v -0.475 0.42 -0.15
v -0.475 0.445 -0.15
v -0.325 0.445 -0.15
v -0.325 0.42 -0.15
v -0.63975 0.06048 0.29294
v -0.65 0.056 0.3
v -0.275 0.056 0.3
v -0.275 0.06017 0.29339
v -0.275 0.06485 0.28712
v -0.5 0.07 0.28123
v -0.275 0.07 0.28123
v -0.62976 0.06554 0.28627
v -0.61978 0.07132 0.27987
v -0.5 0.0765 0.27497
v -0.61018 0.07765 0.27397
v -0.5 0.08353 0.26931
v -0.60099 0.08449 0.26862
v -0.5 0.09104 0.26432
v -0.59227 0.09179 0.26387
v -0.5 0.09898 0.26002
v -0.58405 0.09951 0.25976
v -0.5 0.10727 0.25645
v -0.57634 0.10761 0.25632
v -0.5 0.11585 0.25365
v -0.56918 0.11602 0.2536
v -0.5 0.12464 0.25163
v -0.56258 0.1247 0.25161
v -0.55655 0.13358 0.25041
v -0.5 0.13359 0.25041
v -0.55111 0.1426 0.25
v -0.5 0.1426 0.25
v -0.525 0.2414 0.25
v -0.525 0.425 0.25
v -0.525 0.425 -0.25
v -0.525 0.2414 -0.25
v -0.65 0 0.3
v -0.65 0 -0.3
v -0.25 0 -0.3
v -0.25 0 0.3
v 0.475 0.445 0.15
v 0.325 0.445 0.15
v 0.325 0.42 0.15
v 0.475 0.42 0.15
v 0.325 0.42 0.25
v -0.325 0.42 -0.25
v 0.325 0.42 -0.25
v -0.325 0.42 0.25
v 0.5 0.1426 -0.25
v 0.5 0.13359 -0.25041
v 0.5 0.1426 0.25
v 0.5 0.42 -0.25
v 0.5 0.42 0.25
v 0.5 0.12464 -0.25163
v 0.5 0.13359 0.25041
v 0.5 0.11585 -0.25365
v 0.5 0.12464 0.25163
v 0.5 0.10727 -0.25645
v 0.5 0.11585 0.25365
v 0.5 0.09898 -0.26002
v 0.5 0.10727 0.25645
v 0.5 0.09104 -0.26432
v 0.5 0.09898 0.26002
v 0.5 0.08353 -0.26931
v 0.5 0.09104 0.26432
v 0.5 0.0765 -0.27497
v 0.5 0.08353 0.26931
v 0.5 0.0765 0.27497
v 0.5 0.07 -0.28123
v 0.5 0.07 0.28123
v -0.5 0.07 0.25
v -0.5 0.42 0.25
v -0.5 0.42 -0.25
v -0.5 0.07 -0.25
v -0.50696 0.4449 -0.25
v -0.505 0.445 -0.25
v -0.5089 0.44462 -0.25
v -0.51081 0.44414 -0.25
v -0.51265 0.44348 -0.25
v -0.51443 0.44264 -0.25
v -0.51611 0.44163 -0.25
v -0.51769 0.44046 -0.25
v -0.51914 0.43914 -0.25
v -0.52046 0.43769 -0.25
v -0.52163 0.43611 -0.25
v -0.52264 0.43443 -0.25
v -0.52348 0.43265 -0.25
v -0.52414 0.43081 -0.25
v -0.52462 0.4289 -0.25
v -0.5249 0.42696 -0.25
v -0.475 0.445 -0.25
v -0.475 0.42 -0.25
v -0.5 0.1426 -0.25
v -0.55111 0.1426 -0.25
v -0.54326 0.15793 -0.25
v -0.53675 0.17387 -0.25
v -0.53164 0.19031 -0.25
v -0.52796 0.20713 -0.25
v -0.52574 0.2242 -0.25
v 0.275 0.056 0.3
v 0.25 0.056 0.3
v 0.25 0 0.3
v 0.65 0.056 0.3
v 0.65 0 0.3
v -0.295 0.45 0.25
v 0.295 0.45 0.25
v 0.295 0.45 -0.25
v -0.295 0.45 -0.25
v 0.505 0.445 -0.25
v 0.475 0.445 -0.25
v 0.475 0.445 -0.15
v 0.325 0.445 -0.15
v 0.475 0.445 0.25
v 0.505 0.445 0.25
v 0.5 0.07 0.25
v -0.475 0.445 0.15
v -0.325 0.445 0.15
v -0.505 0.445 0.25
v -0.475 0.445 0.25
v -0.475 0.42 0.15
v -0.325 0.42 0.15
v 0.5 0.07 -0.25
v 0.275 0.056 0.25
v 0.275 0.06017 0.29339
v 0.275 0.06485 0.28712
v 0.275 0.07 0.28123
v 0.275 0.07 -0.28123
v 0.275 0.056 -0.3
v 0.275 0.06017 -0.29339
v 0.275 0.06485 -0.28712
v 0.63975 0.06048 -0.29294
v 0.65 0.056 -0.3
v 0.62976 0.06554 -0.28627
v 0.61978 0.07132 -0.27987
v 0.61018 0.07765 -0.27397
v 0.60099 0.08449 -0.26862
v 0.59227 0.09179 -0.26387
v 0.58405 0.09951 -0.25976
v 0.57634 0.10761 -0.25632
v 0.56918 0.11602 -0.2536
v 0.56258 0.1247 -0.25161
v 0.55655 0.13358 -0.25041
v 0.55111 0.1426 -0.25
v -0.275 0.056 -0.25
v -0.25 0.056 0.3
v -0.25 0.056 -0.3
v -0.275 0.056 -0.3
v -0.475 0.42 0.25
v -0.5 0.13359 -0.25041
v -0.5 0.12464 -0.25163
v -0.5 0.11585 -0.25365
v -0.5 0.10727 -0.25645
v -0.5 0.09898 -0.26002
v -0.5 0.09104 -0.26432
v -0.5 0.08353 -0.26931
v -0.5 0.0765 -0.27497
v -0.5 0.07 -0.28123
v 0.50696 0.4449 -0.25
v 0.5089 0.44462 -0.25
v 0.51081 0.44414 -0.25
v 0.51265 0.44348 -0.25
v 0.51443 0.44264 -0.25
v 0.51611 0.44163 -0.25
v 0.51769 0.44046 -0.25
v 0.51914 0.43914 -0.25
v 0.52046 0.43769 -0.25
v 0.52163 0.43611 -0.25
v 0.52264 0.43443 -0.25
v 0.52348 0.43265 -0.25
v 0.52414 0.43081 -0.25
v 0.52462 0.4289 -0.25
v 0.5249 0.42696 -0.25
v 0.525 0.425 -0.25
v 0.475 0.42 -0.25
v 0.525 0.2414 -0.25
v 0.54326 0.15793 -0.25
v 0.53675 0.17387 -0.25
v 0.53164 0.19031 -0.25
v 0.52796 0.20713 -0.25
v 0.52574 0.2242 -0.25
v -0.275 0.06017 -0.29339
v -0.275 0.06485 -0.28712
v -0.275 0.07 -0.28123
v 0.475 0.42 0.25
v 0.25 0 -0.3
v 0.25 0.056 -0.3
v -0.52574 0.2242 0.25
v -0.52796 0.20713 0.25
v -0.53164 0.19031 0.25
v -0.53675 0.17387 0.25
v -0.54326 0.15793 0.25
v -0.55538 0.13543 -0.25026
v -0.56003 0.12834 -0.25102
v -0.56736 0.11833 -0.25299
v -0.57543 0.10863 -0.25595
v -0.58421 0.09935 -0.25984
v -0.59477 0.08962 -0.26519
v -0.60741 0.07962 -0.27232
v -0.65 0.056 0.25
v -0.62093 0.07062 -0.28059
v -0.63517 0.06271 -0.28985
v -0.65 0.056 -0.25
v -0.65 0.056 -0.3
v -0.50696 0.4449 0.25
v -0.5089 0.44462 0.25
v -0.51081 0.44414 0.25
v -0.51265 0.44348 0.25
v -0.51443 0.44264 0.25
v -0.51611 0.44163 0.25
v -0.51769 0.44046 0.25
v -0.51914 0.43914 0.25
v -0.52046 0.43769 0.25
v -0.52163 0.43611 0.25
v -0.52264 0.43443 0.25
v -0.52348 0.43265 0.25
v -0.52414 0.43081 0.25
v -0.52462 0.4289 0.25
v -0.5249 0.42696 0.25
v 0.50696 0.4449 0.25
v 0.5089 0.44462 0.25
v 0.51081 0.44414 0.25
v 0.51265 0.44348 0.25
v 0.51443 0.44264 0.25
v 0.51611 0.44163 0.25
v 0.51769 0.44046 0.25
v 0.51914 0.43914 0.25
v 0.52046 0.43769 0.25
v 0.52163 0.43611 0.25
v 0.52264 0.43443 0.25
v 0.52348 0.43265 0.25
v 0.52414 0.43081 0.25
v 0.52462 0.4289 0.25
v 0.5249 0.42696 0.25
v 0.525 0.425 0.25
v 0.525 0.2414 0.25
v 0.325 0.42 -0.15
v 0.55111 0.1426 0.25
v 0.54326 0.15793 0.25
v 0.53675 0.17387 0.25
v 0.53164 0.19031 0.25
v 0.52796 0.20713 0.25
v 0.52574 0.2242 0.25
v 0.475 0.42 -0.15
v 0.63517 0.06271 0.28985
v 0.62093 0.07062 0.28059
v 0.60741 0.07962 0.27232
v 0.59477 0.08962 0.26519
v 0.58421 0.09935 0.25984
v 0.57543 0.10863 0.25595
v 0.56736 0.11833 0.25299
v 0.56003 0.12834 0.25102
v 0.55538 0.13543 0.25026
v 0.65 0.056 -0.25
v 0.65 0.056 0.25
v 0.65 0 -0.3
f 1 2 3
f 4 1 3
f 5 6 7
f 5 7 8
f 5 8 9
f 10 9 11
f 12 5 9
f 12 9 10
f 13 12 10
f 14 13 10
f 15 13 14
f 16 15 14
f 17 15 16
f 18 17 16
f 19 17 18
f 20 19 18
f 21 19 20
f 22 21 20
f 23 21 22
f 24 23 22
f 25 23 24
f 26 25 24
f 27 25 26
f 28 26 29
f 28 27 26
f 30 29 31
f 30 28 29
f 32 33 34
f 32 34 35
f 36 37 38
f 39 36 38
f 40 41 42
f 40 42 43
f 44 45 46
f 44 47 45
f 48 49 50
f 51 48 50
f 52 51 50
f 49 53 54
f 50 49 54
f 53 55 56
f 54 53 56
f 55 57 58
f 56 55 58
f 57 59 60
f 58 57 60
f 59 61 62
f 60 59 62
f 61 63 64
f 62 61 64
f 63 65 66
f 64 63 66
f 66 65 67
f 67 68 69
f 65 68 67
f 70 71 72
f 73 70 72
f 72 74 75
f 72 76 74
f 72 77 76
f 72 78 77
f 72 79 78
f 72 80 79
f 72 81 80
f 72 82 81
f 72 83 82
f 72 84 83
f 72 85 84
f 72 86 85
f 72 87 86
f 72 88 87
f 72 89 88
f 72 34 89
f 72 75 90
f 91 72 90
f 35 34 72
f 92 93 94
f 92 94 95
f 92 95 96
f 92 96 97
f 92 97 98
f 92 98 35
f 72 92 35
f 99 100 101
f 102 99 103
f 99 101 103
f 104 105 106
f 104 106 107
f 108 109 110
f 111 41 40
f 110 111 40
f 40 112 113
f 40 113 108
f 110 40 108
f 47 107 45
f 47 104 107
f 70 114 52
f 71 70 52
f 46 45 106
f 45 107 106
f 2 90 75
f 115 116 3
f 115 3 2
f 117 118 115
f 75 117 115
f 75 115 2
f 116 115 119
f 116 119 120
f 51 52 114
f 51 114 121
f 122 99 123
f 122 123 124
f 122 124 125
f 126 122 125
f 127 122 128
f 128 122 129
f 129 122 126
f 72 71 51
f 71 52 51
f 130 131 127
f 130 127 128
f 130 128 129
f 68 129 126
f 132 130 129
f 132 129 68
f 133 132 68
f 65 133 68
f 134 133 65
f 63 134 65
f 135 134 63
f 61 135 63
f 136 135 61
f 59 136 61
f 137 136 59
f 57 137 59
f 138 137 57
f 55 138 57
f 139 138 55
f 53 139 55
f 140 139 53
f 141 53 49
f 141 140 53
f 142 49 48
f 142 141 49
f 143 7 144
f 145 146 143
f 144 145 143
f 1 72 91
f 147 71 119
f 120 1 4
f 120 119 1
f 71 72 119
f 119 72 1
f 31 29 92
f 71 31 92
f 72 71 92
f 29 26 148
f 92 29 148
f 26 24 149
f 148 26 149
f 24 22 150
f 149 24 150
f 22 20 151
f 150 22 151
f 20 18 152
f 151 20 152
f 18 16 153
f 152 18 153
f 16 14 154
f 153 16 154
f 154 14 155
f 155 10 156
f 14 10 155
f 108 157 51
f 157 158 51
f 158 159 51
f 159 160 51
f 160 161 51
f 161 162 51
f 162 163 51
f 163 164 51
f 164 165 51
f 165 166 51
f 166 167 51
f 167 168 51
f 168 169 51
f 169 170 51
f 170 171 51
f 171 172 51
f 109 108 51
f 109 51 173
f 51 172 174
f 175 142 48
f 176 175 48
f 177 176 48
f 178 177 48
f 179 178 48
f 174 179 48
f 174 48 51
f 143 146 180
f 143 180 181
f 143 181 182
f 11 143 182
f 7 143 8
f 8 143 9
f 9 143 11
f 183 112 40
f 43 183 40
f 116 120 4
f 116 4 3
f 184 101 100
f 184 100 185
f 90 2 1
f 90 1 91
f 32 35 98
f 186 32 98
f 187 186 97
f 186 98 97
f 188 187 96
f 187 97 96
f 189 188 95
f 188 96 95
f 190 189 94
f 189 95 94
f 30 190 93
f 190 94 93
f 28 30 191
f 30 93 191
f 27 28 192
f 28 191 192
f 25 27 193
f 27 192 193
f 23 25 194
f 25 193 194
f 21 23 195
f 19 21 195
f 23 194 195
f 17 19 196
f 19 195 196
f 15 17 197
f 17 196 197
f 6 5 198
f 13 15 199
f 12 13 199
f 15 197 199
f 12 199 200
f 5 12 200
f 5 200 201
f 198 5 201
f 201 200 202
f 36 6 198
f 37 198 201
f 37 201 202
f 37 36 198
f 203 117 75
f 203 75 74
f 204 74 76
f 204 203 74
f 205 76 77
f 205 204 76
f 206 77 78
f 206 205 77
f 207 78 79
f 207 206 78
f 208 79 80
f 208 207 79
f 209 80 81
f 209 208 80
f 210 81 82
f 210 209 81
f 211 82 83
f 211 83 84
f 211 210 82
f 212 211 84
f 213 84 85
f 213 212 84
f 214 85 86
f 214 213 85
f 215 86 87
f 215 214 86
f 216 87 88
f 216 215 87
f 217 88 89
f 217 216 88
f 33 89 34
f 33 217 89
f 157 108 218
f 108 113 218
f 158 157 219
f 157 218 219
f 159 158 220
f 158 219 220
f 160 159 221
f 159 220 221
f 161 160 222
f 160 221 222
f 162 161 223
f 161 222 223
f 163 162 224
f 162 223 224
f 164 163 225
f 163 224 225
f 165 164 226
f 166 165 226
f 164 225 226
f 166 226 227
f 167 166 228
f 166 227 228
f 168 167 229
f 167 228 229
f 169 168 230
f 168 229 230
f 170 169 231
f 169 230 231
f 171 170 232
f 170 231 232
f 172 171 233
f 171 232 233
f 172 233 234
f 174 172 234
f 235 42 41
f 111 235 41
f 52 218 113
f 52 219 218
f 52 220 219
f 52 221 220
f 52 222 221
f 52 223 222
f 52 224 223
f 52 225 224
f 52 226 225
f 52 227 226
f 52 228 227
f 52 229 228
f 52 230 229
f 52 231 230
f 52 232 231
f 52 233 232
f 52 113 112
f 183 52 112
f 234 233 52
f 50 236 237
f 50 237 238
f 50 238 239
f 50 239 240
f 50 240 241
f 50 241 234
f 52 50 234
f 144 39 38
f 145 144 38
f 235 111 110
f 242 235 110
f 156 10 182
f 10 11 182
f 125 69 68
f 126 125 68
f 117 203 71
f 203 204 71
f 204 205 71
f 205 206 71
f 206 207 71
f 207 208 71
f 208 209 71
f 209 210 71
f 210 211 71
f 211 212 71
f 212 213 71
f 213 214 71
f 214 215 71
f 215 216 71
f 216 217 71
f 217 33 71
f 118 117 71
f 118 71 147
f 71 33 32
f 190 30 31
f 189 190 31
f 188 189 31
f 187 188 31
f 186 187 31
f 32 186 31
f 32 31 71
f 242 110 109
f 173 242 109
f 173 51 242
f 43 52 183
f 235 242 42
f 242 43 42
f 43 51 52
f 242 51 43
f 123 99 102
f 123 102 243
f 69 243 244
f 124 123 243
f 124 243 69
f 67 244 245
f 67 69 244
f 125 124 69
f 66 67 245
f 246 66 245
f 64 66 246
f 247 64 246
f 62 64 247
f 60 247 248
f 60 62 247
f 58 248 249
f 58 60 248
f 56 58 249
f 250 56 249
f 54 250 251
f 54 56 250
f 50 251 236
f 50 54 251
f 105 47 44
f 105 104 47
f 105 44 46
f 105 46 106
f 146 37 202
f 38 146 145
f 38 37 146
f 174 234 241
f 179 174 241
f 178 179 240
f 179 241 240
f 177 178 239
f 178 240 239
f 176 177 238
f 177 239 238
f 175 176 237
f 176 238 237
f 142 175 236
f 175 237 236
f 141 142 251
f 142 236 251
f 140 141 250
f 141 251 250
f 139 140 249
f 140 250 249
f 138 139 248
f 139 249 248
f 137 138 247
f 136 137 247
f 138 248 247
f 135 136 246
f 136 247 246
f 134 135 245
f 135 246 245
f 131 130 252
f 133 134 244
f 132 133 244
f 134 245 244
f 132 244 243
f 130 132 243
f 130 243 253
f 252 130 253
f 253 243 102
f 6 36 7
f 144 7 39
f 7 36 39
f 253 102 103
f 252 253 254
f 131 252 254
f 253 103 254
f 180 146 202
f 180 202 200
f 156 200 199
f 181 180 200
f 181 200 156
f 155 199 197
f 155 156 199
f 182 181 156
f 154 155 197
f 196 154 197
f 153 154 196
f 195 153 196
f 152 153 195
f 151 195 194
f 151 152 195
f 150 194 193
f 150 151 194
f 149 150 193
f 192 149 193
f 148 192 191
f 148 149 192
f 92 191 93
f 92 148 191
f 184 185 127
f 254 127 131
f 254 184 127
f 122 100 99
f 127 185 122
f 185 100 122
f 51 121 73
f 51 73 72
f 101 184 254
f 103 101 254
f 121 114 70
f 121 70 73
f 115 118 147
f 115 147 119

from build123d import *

# Parameters (mm, degrees)
SKETCH1_W             = 0.5
SKETCH1_H             = 0.35
BOSS_EXTRUDE1_DEPTH   = 0.5
BOSS_EXTRUDE2_DEPTH   = 0.25
BOSS_EXTRUDE2_2_DEPTH = 0.25
SKETCH3_W             = 0.15
SKETCH3_H             = 0.1
CUT_EXTRUDE1_DEPTH    = 0.025
BOSS_EXTRUDE3_DEPTH   = 0.25
SKETCH7_W             = 0.4
SKETCH7_H             = 0.6
BOSS_EXTRUDE5_DEPTH   = 0.056
FILLET3_R             = 0.2
FILLET4_R             = 0.2
FILLET5_R             = 0.1
FILLET6_R             = 0.1


with BuildPart() as part:
    # Sketch1 → Boss-Extrude1 (new, symmetric)
    with BuildSketch(Plane(origin=(0, 0, 0), x_dir=(0, 0, -1), z_dir=(1, 0, 0))):
        with Locations((0, 0.245)):
            Rectangle(SKETCH1_W, SKETCH1_H)
    extrude(amount=BOSS_EXTRUDE1_DEPTH, both=True)


with BuildPart() as body_2:
    # Sketch2 → Boss-Extrude2 (new, symmetric)
    with BuildSketch(Plane.XY):
        with BuildLine():
            Line((-0.325, 0.445), (-0.505, 0.445))
            ThreePointArc((-0.505, 0.445), (-0.519142136, 0.439142136), (-0.525, 0.425))
            Line((-0.525, 0.425), (-0.525, 0.045))
            Line((-0.525, 0.045), (-0.275, 0.045))
            Line((-0.275, 0.045), (-0.275, 0.07))
            Line((-0.275, 0.07), (-0.5, 0.07))
            Line((-0.5, 0.07), (-0.5, 0.42))
            Line((-0.5, 0.42), (-0.325, 0.42))
            Line((-0.325, 0.42), (-0.325, 0.445))
        make_face()
    extrude(amount=BOSS_EXTRUDE2_DEPTH, both=True)


with BuildPart() as body_3:
    # Sketch2 → Boss-Extrude2 2 (new, symmetric)
    with BuildSketch(Plane.XY):
        with BuildLine():
            Line((0.325, 0.42), (0.325, 0.445))
            Line((0.325, 0.445), (0.505, 0.445))
            ThreePointArc((0.505, 0.445), (0.519142136, 0.439142136), (0.525, 0.425))
            Line((0.525, 0.425), (0.525, 0.045))
            Line((0.525, 0.045), (0.275, 0.045))
            Line((0.275, 0.045), (0.275, 0.07))
            Line((0.275, 0.07), (0.5, 0.07))
            Line((0.5, 0.07), (0.5, 0.42))
            Line((0.5, 0.42), (0.325, 0.42))
        make_face()
    extrude(amount=BOSS_EXTRUDE2_2_DEPTH, both=True)


with BuildPart() as cut_extrude1_tool:
    # Sketch3 → Cut-Extrude1 (new body)
    with BuildSketch(Plane(origin=(0, 0.445, 0), x_dir=(1, 0, 0), z_dir=(0, 1, 0))):
        with Locations((-0.4, 0.2)):
            Rectangle(SKETCH3_W, SKETCH3_H)
        with Locations((-0.4, -0.2)):
            Rectangle(SKETCH3_W, SKETCH3_H)
        with Locations((0.4, -0.2)):
            Rectangle(SKETCH3_W, SKETCH3_H)
        with Locations((0.4, 0.2)):
            Rectangle(SKETCH3_W, SKETCH3_H)
    extrude(amount=-CUT_EXTRUDE1_DEPTH)


with BuildPart() as body_2_1:
    add(body_2.part)

    # Cut-Extrude1: cut by cut_extrude1_tool
    add(cut_extrude1_tool.part, mode=Mode.SUBTRACT)



with BuildPart() as body_3_1:
    add(body_3.part)

    # Cut-Extrude1: cut by cut_extrude1_tool
    add(cut_extrude1_tool.part, mode=Mode.SUBTRACT)


with BuildPart() as body_4:
    # Sketch4 → Boss-Extrude3 (new, symmetric)
    with BuildSketch(Plane.XY):
        Polygon((-0.325, 0.42), (0.325, 0.42), (0.295, 0.45), (-0.295, 0.45), align=None)
    extrude(amount=BOSS_EXTRUDE3_DEPTH, both=True)


with BuildPart() as body_2_2:
    add(body_2_1.part)

    add(body_3_1.part)  # Boss-Extrude5 merges body 3
    # Sketch7 → Boss-Extrude5 (add)
    with BuildSketch(Plane(origin=(0, 0, 0), x_dir=(1, 0, 0), z_dir=(0, 1, 0))):
        with Locations((-0.45, 0)):
            Rectangle(SKETCH7_W, SKETCH7_H)
        with Locations((0.45, 0)):
            Rectangle(SKETCH7_W, SKETCH7_H)
    extrude(amount=BOSS_EXTRUDE5_DEPTH)

    # Fillet3
    # the kernel refuses this fillet: 0.2 mm, written as the material it adds along each edge
    with BuildSketch(Plane(origin=(-0.525, 0.056, -0.25), x_dir=(-1, 0, 0), z_dir=(0, 0, 1))) as fillet3_piece_1:
        with BuildLine():
            CenterArc((0.2, -0.185404962), FILLET3_R, 112.024312837, 67.975687163)
            Line((0, -0.185404962), (-0.004, -0.185404962))
            Line((-0.004, -0.185404962), (-0.004, 0))
            Line((-0.004, 0), (0, 0.004))
            ThreePointArc((0, 0.004), (0.0625, 0.004), (0.1235, 0.003708099))
            Line((0.1235, 0.003708099), (0.125, 0))
        make_face()
    extrude(amount=0.5)

    # Fillet4
    # the kernel refuses this fillet: 0.2 mm, written as the material it adds along each edge
    with BuildSketch(Plane(origin=(0.525, 0.056, 0.25), x_dir=(1, 0, 0), z_dir=(0, 0, -1))) as fillet4_piece_1:
        with BuildLine():
            CenterArc((0.2, -0.185404962), FILLET4_R, 112.024312837, 67.975687163)
            Line((0, -0.185404962), (-0.004, -0.185404962))
            Line((-0.004, -0.185404962), (-0.004, 0))
            Line((-0.004, 0), (0, 0.004))
            ThreePointArc((0, 0.004), (0.0625, 0.004), (0.1235, 0.003708099))
            Line((0.1235, 0.003708099), (0.125, 0))
        make_face()
    extrude(amount=0.5)

    # Fillet5
    # the kernel refuses this fillet: 0.1 mm, written as the material it adds along each edge
    with BuildSketch(Plane(origin=(0.65, 0.056, -0.25), x_dir=(0, 1, 0), z_dir=(-1, 0, 0))) as fillet5_piece_1_section:
        with BuildLine():
            CenterArc((0.08660254, 0.1), FILLET5_R, 210, 60)
            Line((0, 0.05), (0, 0))
            Line((0, 0), (0.08660254, 0))
        make_face()
    fillet5_piece_1 = extrude(amount=0.591506351, mode=Mode.PRIVATE)
    fillet5_piece_1 = fillet5_piece_1 - Plane(origin=(0.725, 0.241404962, -0.25), x_dir=(1, 0, 0), z_dir=(0, 0, 1)) * Cylinder(0.2, 2, mode=Mode.PRIVATE)
    fillet5_piece_1 = split(fillet5_piece_1, bisect_by=Plane(origin=(0.5, 0.056, -0.25), z_dir=(1, 0, 0)), keep=Keep.TOP, mode=Mode.PRIVATE)
    add(fillet5_piece_1)
    with BuildSketch(Plane(origin=(0.866506351, 0.056, -0.25), x_dir=(0, 1, 0), z_dir=(-1, 0, 0))) as fillet5_piece_2_section:
        with BuildLine():
            CenterArc((0.08660254, 0.1), FILLET5_R, 210, 60)
            Line((0, 0.05), (0, 0))
            Line((0, 0), (0.08660254, 0))
        make_face()
    fillet5_piece_2 = extrude(amount=0.591506351, mode=Mode.PRIVATE)
    fillet5_piece_2 = split(fillet5_piece_2, bisect_by=Plane(origin=(0.866506351, 0.07, -0.25), z_dir=(0, -1, 0)), keep=Keep.TOP, mode=Mode.PRIVATE)
    fillet5_piece_2 = split(fillet5_piece_2, bisect_by=Plane(origin=(0.5, 0.056, -0.25), z_dir=(-1, 0, 0)), keep=Keep.TOP, mode=Mode.PRIVATE)
    add(fillet5_piece_2)
    with BuildSketch(Plane(origin=(0.275, 0.056, 0.25), x_dir=(0, 2.031291801430194e-12, 1.0), z_dir=(1, 0, 0))) as fillet5_piece_3_section:
        with BuildLine():
            CenterArc((0.1, -0.08660254), FILLET5_R, 120, 60)
            Line((0, -0.08660254), (0, 0))
            Line((0, 0), (0.05, 0))
        make_face()
    fillet5_piece_3 = extrude(amount=0.375, mode=Mode.PRIVATE)
    fillet5_piece_3 = fillet5_piece_3 - Plane(origin=(0.725, 0.241404962, 0.25), x_dir=(1, 0, 0), z_dir=(0, 0, 1)) * Cylinder(0.2, 2, mode=Mode.PRIVATE)
    fillet5_piece_3 = split(fillet5_piece_3, bisect_by=Plane(origin=(0.275, 0.07, 0.25), z_dir=(0, -1, 0)), keep=Keep.TOP, mode=Mode.PRIVATE)
    add(fillet5_piece_3)
    with BuildSketch(Plane(origin=(0.058493649, 0.056, 0.25), x_dir=(0, 2.031291801430194e-12, 1.0), z_dir=(1, 0, 0))) as fillet5_piece_4_section:
        with BuildLine():
            CenterArc((0.1, -0.08660254), FILLET5_R, 120, 60)
            Line((0, -0.08660254), (0, 0))
            Line((0, 0), (0.05, 0))
        make_face()
    fillet5_piece_4 = extrude(amount=0.591506351, mode=Mode.PRIVATE)
    fillet5_piece_4 = fillet5_piece_4 - Plane(origin=(0.725, 0.241404962, 0.25), x_dir=(1, 0, 0), z_dir=(0, 0, 1)) * Cylinder(0.2, 2, mode=Mode.PRIVATE)
    fillet5_piece_4 = split(fillet5_piece_4, bisect_by=Plane(origin=(0.5, 0.056, 0.25), z_dir=(1, 0, 0)), keep=Keep.TOP, mode=Mode.PRIVATE)
    add(fillet5_piece_4)

    # Fillet6
    # the kernel refuses this fillet: 0.1 mm, written as the material it adds along each edge
    with BuildSketch(Plane(origin=(-0.65, 0.056, 0.25), x_dir=(0, 1, 0), z_dir=(1, 0, 0))) as fillet6_piece_1_section:
        with BuildLine():
            CenterArc((0.08660254, 0.1), FILLET6_R, 210, 60)
            Line((0, 0.05), (0, 0))
            Line((0, 0), (0.08660254, 0))
        make_face()
    fillet6_piece_1 = extrude(amount=0.591506351, mode=Mode.PRIVATE)
    fillet6_piece_1 = fillet6_piece_1 - Plane(origin=(-0.725, 0.241404962, 0.25), x_dir=(-1, 0, 0), z_dir=(0, 0, -1)) * Cylinder(0.2, 2, mode=Mode.PRIVATE)
    fillet6_piece_1 = split(fillet6_piece_1, bisect_by=Plane(origin=(-0.5, 0.056, 0.25), z_dir=(-1, 0, 0)), keep=Keep.TOP, mode=Mode.PRIVATE)
    add(fillet6_piece_1)
    with BuildSketch(Plane(origin=(-0.866506351, 0.056, 0.25), x_dir=(0, 1, 0), z_dir=(1, 0, 0))) as fillet6_piece_2_section:
        with BuildLine():
            CenterArc((0.08660254, 0.1), FILLET6_R, 210, 60)
            Line((0, 0.05), (0, 0))
            Line((0, 0), (0.08660254, 0))
        make_face()
    fillet6_piece_2 = extrude(amount=0.591506351, mode=Mode.PRIVATE)
    fillet6_piece_2 = split(fillet6_piece_2, bisect_by=Plane(origin=(-0.866506351, 0.07, 0.25), z_dir=(0, -1, 0)), keep=Keep.TOP, mode=Mode.PRIVATE)
    fillet6_piece_2 = split(fillet6_piece_2, bisect_by=Plane(origin=(-0.5, 0.056, 0.25), z_dir=(1, 0, 0)), keep=Keep.TOP, mode=Mode.PRIVATE)
    add(fillet6_piece_2)
    with BuildSketch(Plane(origin=(-0.275, 0.056, -0.25), x_dir=(0, 2.0315693571863432e-12, -1.0), z_dir=(-1, 0, 0))) as fillet6_piece_3_section:
        with BuildLine():
            CenterArc((0.1, -0.08660254), FILLET6_R, 120, 60)
            Line((0, -0.08660254), (0, 0))
            Line((0, 0), (0.05, 0))
        make_face()
    fillet6_piece_3 = extrude(amount=0.375, mode=Mode.PRIVATE)
    fillet6_piece_3 = fillet6_piece_3 - Plane(origin=(-0.725, 0.241404962, -0.25), x_dir=(-1, 0, 0), z_dir=(0, 0, -1)) * Cylinder(0.2, 2, mode=Mode.PRIVATE)
    fillet6_piece_3 = split(fillet6_piece_3, bisect_by=Plane(origin=(-0.275, 0.07, -0.25), z_dir=(0, -1, 0)), keep=Keep.TOP, mode=Mode.PRIVATE)
    add(fillet6_piece_3)
    with BuildSketch(Plane(origin=(-0.058493649, 0.056, -0.25), x_dir=(0, 2.0315693571863432e-12, -1.0), z_dir=(-1, 0, 0))) as fillet6_piece_4_section:
        with BuildLine():
            CenterArc((0.1, -0.08660254), FILLET6_R, 120, 60)
            Line((0, -0.08660254), (0, 0))
            Line((0, 0), (0.05, 0))
        make_face()
    fillet6_piece_4 = extrude(amount=0.591506351, mode=Mode.PRIVATE)
    fillet6_piece_4 = fillet6_piece_4 - Plane(origin=(-0.725, 0.241404962, -0.25), x_dir=(-1, 0, 0), z_dir=(0, 0, -1)) * Cylinder(0.2, 2, mode=Mode.PRIVATE)
    fillet6_piece_4 = split(fillet6_piece_4, bisect_by=Plane(origin=(-0.5, 0.056, -0.25), z_dir=(-1, 0, 0)), keep=Keep.TOP, mode=Mode.PRIVATE)
    add(fillet6_piece_4)


solid = Compound([part.part, body_4.part, body_2_2.part])
